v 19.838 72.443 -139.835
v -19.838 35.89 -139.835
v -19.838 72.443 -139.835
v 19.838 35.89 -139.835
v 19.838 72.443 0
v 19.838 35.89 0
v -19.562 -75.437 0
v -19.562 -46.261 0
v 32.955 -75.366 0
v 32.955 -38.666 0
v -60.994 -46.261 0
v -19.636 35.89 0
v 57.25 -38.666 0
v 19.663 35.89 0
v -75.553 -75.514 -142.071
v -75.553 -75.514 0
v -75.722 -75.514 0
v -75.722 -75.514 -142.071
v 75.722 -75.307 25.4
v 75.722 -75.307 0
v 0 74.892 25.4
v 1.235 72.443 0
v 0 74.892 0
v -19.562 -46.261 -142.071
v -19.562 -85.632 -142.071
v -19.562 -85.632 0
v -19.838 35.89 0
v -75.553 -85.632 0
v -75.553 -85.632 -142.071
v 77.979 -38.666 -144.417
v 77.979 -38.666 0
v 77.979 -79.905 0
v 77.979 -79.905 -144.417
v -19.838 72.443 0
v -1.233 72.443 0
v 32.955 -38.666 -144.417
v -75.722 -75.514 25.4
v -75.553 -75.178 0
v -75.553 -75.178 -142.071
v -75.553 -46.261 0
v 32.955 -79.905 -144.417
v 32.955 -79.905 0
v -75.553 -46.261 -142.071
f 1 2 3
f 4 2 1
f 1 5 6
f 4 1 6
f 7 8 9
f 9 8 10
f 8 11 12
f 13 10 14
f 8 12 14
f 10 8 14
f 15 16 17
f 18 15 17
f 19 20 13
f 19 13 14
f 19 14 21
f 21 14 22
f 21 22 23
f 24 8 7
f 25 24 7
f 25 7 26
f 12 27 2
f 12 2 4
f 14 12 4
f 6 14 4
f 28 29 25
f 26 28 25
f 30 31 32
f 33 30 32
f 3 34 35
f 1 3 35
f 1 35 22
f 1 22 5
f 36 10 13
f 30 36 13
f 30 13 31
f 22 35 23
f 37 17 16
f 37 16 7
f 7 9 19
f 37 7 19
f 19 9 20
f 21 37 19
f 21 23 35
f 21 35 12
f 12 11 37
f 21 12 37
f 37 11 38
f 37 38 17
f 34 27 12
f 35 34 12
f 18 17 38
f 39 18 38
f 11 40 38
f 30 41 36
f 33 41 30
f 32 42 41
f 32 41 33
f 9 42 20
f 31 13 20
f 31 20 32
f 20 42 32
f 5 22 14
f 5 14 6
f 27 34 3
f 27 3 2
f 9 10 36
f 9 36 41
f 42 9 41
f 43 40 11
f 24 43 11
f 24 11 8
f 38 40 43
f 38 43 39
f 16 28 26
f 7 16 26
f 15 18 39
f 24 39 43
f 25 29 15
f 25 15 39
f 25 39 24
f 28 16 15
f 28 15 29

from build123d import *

# Parameters (mm, degrees)
F1_DEPTH = 25.4
F4_W     = 55.9908
F4_H     = 39.370671
F5_DEPTH = 142.071173
F6_W     = 39.675076
F6_H     = 36.552988
F7_DEPTH = 139.835253
F8_W     = 45.023777
F8_H     = 41.238799
F9_DEPTH = 144.416898


with BuildPart() as f1:
    # F0 (on Top) → F1 (new body)
    with BuildSketch(Plane.XY):
        Polygon((0, 74.892037), (-75.72189, -75.514391), (75.72183, -75.306922), align=None)
    extrude(amount=F1_DEPTH)

    # F2 (on face) + F4 (on face) → F5 (join)
    with BuildSketch(Plane(origin=(0, 0, 0), x_dir=(1, 0, 0), z_dir=(0, 0, -1))):
        Polygon((-41.094646, 48.674494), (-41.094646, 75.466954), (-75.72189, 75.514391), (-62.209384, 48.674494), align=None)
    with BuildSketch(Plane(origin=(0, 0, 0), x_dir=(1, 0, 0), z_dir=(0, 0, -1))):
        with Locations((-47.557339, 65.946586)):
            Rectangle(F4_W, F4_H)
    extrude(amount=F5_DEPTH)

    # F6 (on face) → F7 (join)
    with BuildSketch(Plane(origin=(0, 0, 0), x_dir=(1, 0, 0), z_dir=(0, 0, -1))):
        with Locations((0, -54.166105)):
            Rectangle(F6_W, F6_H)
    extrude(amount=F7_DEPTH)

    # F8 (on face) → F9 (join)
    with BuildSketch(Plane(origin=(0, 0, 0), x_dir=(1, 0, 0), z_dir=(0, 0, -1))):
        with Locations((55.466999, 59.285469)):
            Rectangle(F8_W, F8_H)
    extrude(amount=F9_DEPTH)


solid = f1.part
